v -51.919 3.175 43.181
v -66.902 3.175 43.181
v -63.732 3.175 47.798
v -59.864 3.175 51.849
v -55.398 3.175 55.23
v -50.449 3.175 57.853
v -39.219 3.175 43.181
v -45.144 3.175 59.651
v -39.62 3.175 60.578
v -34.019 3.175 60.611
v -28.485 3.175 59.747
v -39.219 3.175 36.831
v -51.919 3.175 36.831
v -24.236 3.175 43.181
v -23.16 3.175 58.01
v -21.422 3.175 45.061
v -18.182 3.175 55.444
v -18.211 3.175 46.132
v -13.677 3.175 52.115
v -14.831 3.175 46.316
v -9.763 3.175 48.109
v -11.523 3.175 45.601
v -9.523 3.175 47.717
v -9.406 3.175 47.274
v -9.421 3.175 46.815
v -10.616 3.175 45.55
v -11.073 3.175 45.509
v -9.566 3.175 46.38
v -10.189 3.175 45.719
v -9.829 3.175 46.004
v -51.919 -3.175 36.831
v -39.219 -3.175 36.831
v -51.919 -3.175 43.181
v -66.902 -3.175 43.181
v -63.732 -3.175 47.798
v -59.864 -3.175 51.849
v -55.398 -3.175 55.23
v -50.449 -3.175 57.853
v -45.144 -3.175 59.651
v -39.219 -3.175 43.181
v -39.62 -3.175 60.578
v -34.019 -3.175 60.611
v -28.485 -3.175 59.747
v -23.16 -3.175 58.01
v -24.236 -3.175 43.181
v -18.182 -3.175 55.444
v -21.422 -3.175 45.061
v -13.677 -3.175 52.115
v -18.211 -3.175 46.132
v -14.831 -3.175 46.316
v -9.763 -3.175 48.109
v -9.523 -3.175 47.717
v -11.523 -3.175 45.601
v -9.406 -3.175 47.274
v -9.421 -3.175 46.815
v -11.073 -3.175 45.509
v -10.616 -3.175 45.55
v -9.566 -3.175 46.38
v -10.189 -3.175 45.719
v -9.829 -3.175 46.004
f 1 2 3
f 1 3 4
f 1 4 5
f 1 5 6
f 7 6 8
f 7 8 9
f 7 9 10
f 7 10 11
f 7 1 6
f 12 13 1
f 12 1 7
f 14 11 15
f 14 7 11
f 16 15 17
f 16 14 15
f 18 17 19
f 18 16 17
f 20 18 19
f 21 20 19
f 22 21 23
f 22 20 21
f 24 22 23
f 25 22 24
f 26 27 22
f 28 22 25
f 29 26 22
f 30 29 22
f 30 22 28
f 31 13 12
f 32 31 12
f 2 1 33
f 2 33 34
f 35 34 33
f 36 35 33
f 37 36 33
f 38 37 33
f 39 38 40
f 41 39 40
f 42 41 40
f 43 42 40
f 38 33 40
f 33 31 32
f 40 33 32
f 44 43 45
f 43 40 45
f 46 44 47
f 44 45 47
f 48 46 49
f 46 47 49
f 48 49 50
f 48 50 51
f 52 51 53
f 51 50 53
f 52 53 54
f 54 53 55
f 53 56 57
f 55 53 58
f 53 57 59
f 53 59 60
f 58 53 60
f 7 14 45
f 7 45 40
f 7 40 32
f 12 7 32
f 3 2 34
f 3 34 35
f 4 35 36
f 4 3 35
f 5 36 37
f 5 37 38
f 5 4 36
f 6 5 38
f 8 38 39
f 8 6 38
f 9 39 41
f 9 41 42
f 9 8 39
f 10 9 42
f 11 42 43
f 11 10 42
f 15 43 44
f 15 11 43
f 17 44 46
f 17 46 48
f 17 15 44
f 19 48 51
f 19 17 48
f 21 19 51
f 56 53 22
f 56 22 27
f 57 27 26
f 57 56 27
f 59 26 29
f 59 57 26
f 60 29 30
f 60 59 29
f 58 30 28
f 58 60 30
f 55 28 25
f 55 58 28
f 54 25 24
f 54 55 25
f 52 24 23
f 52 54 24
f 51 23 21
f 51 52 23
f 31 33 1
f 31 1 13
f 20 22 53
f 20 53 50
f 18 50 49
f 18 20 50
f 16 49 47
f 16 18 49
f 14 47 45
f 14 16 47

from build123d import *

# Parameters (mm, degrees)
BOSS_EXTRUDE1_DEPTH = 3.175
FILLET1_START       = -4
FILLET1_DEPTH       = 8
SKETCH2_W           = 12.7
SKETCH2_H           = 6.35
BOSS_EXTRUDE2_DEPTH = 6.35


with BuildPart() as part:
    # Sketch1 → Boss-Extrude1 (new, symmetric)
    with BuildSketch(Plane(origin=(0, 0, 0), x_dir=(1, 0, 0), z_dir=(0, 1, 0))):
        with BuildLine():
            Line((-54.202443258, -43.180856192), (-66.902443258, -43.180856192))
            ThreePointArc((-66.902443258, -43.180856192), (-33.83954697, -60.596845897), (-3.959326756, -38.154826194))
            ThreePointArc((-3.959326756, -38.154826194), (-12.780230261, -45.982812034), (-24.23600367, -43.180856192))
            Line((-24.23600367, -43.180856192), (-41.502443258, -43.180856192))
            Line((-41.502443258, -43.180856192), (-54.202443258, -43.180856192))
        make_face()
    extrude(amount=BOSS_EXTRUDE1_DEPTH, both=True)

    # Fillet1: read off the stored shape, not the designer's step
    # Fillet1 outline → Fillet1 (cut)
    with BuildSketch(Plane(origin=(0, 0, 0), x_dir=(1, 0, 0), z_dir=(0, 1, 0)).offset(FILLET1_START)):
        with BuildLine():
            ThreePointArc((-11.522510786, -45.600981794), (-9.683883576, -46.182242141), (-9.76258933, -48.108954111))
            ThreePointArc((-9.76258933, -48.108954111), (-6.447625568, -43.372863288), (-3.959326789, -38.15482628))
            ThreePointArc((-3.959326789, -38.15482628), (-6.925777422, -42.705856679), (-11.522510786, -45.600981794))
        make_face()
    extrude(amount=FILLET1_DEPTH, mode=Mode.SUBTRACT)

    # Sketch2 → Boss-Extrude2 (add)
    with BuildSketch(Plane(origin=(0, 3.175, 0), x_dir=(1, 0, 0), z_dir=(0, 1, 0))):
        with Locations((-45.569223464, -40.005856192)):
            Rectangle(SKETCH2_W, SKETCH2_H)
    extrude(amount=-BOSS_EXTRUDE2_DEPTH)


solid = part.part
